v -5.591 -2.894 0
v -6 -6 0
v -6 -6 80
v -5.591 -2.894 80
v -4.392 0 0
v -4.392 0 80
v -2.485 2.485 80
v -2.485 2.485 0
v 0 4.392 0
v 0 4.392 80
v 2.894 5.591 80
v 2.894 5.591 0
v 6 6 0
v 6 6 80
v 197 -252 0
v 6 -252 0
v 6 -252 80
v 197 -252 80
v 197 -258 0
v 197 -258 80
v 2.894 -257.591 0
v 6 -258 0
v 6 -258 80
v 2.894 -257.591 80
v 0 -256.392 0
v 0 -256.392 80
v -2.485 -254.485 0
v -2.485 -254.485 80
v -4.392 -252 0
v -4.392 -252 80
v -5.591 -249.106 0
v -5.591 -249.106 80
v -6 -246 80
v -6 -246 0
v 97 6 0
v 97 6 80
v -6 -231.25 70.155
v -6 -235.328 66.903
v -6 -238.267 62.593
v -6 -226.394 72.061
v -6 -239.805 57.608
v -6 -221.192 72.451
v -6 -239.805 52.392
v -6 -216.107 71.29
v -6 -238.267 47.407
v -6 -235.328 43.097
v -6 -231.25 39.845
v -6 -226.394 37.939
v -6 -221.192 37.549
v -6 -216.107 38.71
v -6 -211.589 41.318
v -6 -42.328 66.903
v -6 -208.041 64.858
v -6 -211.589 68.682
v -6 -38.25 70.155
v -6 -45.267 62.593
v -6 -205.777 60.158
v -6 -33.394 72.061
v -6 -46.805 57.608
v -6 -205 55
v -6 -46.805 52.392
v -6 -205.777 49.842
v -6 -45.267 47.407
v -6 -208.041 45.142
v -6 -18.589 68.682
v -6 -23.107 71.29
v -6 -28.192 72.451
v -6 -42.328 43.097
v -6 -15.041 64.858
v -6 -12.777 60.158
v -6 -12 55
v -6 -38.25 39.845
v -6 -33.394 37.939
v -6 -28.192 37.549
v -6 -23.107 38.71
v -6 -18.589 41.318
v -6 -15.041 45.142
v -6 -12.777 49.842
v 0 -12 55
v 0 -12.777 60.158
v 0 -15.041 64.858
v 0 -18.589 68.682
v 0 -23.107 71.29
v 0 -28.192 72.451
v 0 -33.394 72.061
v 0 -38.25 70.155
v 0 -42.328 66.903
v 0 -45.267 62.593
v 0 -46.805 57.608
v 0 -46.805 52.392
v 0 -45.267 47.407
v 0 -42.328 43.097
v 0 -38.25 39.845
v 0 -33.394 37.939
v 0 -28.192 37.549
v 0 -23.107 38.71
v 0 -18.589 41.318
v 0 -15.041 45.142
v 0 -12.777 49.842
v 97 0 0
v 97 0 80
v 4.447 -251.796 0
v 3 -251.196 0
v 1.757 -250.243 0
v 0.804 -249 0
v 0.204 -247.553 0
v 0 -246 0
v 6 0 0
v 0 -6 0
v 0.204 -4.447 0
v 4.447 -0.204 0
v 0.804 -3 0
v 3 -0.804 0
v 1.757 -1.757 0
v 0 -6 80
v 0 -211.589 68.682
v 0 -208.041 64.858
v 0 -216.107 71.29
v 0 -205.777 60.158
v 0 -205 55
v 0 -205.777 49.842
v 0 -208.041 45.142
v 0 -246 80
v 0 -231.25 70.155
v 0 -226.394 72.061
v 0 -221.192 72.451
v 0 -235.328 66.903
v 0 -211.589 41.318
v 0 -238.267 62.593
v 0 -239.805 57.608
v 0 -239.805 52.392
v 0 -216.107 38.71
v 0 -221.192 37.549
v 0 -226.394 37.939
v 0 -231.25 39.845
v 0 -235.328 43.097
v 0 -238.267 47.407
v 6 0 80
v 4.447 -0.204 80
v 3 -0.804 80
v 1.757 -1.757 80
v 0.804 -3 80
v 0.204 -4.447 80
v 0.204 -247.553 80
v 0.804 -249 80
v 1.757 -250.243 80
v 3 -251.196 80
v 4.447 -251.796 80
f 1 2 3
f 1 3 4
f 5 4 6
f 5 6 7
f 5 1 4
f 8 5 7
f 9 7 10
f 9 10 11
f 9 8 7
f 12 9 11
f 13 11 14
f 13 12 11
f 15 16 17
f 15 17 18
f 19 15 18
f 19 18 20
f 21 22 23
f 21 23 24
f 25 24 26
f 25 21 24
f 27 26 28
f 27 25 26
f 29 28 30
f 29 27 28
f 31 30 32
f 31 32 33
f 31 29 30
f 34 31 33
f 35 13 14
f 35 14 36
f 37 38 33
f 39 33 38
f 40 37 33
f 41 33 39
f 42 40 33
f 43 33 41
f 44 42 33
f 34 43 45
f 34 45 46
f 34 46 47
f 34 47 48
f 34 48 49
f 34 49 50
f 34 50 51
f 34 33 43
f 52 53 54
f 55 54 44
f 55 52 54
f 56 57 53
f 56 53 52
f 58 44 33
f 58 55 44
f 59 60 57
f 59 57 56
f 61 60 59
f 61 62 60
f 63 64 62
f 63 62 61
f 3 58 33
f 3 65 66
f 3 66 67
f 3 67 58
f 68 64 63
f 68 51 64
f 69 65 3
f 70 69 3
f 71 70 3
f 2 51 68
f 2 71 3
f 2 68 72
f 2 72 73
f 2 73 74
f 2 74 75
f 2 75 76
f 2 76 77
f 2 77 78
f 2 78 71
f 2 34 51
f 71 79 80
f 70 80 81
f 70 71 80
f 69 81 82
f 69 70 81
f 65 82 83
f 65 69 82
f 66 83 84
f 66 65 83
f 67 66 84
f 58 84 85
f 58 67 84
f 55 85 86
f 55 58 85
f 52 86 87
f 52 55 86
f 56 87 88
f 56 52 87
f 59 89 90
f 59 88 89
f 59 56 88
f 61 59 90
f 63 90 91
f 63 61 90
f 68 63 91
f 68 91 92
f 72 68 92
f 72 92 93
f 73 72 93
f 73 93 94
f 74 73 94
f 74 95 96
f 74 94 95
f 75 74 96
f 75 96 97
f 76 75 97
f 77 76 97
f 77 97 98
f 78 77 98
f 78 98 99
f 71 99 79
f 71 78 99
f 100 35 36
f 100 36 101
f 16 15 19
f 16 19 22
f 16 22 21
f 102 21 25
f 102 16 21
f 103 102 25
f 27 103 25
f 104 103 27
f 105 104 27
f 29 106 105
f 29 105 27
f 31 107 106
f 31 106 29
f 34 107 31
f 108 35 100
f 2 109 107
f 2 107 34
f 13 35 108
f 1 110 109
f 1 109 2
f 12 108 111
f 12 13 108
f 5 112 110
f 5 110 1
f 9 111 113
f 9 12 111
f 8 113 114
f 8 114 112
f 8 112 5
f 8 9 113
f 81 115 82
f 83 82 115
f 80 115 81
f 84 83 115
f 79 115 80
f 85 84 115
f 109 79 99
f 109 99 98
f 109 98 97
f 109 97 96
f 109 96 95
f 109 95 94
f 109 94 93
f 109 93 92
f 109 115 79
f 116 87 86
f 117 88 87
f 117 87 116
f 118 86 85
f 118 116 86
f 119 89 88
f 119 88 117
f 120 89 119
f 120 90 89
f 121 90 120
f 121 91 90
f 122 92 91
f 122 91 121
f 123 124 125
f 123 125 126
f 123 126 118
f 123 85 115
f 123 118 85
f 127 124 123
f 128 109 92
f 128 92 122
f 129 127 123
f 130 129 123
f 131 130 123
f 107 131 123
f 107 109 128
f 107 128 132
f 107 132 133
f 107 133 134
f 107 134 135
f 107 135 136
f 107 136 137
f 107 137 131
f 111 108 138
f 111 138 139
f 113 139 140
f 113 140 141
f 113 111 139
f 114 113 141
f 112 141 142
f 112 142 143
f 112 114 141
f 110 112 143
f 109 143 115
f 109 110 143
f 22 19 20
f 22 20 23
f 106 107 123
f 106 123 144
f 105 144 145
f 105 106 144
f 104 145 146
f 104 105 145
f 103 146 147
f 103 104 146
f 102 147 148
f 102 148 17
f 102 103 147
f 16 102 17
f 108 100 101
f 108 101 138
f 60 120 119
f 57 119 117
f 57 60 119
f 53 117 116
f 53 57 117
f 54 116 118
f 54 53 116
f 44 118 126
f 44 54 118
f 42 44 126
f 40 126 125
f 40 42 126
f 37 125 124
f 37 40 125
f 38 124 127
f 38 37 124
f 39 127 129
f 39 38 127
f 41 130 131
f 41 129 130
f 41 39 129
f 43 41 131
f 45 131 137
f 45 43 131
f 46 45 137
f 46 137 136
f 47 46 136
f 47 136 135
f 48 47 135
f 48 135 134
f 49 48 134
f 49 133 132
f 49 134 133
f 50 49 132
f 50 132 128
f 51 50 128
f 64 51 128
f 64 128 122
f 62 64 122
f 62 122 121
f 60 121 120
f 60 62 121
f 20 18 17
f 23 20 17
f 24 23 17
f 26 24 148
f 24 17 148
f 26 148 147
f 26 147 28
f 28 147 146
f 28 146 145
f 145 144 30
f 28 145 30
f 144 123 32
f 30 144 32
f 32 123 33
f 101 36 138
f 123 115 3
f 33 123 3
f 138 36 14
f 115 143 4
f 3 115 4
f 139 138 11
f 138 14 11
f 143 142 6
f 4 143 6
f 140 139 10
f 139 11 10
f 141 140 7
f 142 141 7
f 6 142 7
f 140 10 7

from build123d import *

# Parameters (mm, degrees)
SM_BASE_FLANGE_1_DEPTH = 80
SKETCH_6_R             = 17.5
CUT_EXTRUDE_1_DEPTH    = 10


# Sheet-metal steps are written as plain solids
with BuildPart() as part:
    # Sketch 1 → 基体-法兰1 (new body)
    with BuildSketch(Plane.XY):
        with BuildLine():
            Line((97, 0), (6, 0))
            ThreePointArc((6, 0), (1.757359313, -1.757359313), (0, -6))
            Line((0, -6), (0, -246))
            ThreePointArc((0, -246), (1.757359313, -250.242640687), (6, -252))
            Line((6, -252), (197, -252))
            Line((197, -252), (197, -258))
            Line((197, -258), (6, -258))
            ThreePointArc((6, -258), (-2.485281374, -254.485281374), (-6, -246))
            Line((-6, -246), (-6, -6))
            ThreePointArc((-6, -6), (-2.485281374, 2.485281374), (6, 6))
            Line((6, 6), (97, 6))
            Line((97, 6), (97, 0))
        make_face()
    extrude(amount=SM_BASE_FLANGE_1_DEPTH)

    # 草图6 → 切除-拉伸1 (cut)
    with BuildSketch(Plane(origin=(-6, 0, 0), x_dir=(0, 0, -1), z_dir=(1, 0, 0))):
        with Locations(Location((-55, -29.5, 0), (0, 0, 90))):
            Circle(SKETCH_6_R)
        with Locations(Location((-55, -222.5, 0), (0, 0, 90))):
            Circle(SKETCH_6_R)
    extrude(amount=CUT_EXTRUDE_1_DEPTH, mode=Mode.SUBTRACT)


solid = part.part
